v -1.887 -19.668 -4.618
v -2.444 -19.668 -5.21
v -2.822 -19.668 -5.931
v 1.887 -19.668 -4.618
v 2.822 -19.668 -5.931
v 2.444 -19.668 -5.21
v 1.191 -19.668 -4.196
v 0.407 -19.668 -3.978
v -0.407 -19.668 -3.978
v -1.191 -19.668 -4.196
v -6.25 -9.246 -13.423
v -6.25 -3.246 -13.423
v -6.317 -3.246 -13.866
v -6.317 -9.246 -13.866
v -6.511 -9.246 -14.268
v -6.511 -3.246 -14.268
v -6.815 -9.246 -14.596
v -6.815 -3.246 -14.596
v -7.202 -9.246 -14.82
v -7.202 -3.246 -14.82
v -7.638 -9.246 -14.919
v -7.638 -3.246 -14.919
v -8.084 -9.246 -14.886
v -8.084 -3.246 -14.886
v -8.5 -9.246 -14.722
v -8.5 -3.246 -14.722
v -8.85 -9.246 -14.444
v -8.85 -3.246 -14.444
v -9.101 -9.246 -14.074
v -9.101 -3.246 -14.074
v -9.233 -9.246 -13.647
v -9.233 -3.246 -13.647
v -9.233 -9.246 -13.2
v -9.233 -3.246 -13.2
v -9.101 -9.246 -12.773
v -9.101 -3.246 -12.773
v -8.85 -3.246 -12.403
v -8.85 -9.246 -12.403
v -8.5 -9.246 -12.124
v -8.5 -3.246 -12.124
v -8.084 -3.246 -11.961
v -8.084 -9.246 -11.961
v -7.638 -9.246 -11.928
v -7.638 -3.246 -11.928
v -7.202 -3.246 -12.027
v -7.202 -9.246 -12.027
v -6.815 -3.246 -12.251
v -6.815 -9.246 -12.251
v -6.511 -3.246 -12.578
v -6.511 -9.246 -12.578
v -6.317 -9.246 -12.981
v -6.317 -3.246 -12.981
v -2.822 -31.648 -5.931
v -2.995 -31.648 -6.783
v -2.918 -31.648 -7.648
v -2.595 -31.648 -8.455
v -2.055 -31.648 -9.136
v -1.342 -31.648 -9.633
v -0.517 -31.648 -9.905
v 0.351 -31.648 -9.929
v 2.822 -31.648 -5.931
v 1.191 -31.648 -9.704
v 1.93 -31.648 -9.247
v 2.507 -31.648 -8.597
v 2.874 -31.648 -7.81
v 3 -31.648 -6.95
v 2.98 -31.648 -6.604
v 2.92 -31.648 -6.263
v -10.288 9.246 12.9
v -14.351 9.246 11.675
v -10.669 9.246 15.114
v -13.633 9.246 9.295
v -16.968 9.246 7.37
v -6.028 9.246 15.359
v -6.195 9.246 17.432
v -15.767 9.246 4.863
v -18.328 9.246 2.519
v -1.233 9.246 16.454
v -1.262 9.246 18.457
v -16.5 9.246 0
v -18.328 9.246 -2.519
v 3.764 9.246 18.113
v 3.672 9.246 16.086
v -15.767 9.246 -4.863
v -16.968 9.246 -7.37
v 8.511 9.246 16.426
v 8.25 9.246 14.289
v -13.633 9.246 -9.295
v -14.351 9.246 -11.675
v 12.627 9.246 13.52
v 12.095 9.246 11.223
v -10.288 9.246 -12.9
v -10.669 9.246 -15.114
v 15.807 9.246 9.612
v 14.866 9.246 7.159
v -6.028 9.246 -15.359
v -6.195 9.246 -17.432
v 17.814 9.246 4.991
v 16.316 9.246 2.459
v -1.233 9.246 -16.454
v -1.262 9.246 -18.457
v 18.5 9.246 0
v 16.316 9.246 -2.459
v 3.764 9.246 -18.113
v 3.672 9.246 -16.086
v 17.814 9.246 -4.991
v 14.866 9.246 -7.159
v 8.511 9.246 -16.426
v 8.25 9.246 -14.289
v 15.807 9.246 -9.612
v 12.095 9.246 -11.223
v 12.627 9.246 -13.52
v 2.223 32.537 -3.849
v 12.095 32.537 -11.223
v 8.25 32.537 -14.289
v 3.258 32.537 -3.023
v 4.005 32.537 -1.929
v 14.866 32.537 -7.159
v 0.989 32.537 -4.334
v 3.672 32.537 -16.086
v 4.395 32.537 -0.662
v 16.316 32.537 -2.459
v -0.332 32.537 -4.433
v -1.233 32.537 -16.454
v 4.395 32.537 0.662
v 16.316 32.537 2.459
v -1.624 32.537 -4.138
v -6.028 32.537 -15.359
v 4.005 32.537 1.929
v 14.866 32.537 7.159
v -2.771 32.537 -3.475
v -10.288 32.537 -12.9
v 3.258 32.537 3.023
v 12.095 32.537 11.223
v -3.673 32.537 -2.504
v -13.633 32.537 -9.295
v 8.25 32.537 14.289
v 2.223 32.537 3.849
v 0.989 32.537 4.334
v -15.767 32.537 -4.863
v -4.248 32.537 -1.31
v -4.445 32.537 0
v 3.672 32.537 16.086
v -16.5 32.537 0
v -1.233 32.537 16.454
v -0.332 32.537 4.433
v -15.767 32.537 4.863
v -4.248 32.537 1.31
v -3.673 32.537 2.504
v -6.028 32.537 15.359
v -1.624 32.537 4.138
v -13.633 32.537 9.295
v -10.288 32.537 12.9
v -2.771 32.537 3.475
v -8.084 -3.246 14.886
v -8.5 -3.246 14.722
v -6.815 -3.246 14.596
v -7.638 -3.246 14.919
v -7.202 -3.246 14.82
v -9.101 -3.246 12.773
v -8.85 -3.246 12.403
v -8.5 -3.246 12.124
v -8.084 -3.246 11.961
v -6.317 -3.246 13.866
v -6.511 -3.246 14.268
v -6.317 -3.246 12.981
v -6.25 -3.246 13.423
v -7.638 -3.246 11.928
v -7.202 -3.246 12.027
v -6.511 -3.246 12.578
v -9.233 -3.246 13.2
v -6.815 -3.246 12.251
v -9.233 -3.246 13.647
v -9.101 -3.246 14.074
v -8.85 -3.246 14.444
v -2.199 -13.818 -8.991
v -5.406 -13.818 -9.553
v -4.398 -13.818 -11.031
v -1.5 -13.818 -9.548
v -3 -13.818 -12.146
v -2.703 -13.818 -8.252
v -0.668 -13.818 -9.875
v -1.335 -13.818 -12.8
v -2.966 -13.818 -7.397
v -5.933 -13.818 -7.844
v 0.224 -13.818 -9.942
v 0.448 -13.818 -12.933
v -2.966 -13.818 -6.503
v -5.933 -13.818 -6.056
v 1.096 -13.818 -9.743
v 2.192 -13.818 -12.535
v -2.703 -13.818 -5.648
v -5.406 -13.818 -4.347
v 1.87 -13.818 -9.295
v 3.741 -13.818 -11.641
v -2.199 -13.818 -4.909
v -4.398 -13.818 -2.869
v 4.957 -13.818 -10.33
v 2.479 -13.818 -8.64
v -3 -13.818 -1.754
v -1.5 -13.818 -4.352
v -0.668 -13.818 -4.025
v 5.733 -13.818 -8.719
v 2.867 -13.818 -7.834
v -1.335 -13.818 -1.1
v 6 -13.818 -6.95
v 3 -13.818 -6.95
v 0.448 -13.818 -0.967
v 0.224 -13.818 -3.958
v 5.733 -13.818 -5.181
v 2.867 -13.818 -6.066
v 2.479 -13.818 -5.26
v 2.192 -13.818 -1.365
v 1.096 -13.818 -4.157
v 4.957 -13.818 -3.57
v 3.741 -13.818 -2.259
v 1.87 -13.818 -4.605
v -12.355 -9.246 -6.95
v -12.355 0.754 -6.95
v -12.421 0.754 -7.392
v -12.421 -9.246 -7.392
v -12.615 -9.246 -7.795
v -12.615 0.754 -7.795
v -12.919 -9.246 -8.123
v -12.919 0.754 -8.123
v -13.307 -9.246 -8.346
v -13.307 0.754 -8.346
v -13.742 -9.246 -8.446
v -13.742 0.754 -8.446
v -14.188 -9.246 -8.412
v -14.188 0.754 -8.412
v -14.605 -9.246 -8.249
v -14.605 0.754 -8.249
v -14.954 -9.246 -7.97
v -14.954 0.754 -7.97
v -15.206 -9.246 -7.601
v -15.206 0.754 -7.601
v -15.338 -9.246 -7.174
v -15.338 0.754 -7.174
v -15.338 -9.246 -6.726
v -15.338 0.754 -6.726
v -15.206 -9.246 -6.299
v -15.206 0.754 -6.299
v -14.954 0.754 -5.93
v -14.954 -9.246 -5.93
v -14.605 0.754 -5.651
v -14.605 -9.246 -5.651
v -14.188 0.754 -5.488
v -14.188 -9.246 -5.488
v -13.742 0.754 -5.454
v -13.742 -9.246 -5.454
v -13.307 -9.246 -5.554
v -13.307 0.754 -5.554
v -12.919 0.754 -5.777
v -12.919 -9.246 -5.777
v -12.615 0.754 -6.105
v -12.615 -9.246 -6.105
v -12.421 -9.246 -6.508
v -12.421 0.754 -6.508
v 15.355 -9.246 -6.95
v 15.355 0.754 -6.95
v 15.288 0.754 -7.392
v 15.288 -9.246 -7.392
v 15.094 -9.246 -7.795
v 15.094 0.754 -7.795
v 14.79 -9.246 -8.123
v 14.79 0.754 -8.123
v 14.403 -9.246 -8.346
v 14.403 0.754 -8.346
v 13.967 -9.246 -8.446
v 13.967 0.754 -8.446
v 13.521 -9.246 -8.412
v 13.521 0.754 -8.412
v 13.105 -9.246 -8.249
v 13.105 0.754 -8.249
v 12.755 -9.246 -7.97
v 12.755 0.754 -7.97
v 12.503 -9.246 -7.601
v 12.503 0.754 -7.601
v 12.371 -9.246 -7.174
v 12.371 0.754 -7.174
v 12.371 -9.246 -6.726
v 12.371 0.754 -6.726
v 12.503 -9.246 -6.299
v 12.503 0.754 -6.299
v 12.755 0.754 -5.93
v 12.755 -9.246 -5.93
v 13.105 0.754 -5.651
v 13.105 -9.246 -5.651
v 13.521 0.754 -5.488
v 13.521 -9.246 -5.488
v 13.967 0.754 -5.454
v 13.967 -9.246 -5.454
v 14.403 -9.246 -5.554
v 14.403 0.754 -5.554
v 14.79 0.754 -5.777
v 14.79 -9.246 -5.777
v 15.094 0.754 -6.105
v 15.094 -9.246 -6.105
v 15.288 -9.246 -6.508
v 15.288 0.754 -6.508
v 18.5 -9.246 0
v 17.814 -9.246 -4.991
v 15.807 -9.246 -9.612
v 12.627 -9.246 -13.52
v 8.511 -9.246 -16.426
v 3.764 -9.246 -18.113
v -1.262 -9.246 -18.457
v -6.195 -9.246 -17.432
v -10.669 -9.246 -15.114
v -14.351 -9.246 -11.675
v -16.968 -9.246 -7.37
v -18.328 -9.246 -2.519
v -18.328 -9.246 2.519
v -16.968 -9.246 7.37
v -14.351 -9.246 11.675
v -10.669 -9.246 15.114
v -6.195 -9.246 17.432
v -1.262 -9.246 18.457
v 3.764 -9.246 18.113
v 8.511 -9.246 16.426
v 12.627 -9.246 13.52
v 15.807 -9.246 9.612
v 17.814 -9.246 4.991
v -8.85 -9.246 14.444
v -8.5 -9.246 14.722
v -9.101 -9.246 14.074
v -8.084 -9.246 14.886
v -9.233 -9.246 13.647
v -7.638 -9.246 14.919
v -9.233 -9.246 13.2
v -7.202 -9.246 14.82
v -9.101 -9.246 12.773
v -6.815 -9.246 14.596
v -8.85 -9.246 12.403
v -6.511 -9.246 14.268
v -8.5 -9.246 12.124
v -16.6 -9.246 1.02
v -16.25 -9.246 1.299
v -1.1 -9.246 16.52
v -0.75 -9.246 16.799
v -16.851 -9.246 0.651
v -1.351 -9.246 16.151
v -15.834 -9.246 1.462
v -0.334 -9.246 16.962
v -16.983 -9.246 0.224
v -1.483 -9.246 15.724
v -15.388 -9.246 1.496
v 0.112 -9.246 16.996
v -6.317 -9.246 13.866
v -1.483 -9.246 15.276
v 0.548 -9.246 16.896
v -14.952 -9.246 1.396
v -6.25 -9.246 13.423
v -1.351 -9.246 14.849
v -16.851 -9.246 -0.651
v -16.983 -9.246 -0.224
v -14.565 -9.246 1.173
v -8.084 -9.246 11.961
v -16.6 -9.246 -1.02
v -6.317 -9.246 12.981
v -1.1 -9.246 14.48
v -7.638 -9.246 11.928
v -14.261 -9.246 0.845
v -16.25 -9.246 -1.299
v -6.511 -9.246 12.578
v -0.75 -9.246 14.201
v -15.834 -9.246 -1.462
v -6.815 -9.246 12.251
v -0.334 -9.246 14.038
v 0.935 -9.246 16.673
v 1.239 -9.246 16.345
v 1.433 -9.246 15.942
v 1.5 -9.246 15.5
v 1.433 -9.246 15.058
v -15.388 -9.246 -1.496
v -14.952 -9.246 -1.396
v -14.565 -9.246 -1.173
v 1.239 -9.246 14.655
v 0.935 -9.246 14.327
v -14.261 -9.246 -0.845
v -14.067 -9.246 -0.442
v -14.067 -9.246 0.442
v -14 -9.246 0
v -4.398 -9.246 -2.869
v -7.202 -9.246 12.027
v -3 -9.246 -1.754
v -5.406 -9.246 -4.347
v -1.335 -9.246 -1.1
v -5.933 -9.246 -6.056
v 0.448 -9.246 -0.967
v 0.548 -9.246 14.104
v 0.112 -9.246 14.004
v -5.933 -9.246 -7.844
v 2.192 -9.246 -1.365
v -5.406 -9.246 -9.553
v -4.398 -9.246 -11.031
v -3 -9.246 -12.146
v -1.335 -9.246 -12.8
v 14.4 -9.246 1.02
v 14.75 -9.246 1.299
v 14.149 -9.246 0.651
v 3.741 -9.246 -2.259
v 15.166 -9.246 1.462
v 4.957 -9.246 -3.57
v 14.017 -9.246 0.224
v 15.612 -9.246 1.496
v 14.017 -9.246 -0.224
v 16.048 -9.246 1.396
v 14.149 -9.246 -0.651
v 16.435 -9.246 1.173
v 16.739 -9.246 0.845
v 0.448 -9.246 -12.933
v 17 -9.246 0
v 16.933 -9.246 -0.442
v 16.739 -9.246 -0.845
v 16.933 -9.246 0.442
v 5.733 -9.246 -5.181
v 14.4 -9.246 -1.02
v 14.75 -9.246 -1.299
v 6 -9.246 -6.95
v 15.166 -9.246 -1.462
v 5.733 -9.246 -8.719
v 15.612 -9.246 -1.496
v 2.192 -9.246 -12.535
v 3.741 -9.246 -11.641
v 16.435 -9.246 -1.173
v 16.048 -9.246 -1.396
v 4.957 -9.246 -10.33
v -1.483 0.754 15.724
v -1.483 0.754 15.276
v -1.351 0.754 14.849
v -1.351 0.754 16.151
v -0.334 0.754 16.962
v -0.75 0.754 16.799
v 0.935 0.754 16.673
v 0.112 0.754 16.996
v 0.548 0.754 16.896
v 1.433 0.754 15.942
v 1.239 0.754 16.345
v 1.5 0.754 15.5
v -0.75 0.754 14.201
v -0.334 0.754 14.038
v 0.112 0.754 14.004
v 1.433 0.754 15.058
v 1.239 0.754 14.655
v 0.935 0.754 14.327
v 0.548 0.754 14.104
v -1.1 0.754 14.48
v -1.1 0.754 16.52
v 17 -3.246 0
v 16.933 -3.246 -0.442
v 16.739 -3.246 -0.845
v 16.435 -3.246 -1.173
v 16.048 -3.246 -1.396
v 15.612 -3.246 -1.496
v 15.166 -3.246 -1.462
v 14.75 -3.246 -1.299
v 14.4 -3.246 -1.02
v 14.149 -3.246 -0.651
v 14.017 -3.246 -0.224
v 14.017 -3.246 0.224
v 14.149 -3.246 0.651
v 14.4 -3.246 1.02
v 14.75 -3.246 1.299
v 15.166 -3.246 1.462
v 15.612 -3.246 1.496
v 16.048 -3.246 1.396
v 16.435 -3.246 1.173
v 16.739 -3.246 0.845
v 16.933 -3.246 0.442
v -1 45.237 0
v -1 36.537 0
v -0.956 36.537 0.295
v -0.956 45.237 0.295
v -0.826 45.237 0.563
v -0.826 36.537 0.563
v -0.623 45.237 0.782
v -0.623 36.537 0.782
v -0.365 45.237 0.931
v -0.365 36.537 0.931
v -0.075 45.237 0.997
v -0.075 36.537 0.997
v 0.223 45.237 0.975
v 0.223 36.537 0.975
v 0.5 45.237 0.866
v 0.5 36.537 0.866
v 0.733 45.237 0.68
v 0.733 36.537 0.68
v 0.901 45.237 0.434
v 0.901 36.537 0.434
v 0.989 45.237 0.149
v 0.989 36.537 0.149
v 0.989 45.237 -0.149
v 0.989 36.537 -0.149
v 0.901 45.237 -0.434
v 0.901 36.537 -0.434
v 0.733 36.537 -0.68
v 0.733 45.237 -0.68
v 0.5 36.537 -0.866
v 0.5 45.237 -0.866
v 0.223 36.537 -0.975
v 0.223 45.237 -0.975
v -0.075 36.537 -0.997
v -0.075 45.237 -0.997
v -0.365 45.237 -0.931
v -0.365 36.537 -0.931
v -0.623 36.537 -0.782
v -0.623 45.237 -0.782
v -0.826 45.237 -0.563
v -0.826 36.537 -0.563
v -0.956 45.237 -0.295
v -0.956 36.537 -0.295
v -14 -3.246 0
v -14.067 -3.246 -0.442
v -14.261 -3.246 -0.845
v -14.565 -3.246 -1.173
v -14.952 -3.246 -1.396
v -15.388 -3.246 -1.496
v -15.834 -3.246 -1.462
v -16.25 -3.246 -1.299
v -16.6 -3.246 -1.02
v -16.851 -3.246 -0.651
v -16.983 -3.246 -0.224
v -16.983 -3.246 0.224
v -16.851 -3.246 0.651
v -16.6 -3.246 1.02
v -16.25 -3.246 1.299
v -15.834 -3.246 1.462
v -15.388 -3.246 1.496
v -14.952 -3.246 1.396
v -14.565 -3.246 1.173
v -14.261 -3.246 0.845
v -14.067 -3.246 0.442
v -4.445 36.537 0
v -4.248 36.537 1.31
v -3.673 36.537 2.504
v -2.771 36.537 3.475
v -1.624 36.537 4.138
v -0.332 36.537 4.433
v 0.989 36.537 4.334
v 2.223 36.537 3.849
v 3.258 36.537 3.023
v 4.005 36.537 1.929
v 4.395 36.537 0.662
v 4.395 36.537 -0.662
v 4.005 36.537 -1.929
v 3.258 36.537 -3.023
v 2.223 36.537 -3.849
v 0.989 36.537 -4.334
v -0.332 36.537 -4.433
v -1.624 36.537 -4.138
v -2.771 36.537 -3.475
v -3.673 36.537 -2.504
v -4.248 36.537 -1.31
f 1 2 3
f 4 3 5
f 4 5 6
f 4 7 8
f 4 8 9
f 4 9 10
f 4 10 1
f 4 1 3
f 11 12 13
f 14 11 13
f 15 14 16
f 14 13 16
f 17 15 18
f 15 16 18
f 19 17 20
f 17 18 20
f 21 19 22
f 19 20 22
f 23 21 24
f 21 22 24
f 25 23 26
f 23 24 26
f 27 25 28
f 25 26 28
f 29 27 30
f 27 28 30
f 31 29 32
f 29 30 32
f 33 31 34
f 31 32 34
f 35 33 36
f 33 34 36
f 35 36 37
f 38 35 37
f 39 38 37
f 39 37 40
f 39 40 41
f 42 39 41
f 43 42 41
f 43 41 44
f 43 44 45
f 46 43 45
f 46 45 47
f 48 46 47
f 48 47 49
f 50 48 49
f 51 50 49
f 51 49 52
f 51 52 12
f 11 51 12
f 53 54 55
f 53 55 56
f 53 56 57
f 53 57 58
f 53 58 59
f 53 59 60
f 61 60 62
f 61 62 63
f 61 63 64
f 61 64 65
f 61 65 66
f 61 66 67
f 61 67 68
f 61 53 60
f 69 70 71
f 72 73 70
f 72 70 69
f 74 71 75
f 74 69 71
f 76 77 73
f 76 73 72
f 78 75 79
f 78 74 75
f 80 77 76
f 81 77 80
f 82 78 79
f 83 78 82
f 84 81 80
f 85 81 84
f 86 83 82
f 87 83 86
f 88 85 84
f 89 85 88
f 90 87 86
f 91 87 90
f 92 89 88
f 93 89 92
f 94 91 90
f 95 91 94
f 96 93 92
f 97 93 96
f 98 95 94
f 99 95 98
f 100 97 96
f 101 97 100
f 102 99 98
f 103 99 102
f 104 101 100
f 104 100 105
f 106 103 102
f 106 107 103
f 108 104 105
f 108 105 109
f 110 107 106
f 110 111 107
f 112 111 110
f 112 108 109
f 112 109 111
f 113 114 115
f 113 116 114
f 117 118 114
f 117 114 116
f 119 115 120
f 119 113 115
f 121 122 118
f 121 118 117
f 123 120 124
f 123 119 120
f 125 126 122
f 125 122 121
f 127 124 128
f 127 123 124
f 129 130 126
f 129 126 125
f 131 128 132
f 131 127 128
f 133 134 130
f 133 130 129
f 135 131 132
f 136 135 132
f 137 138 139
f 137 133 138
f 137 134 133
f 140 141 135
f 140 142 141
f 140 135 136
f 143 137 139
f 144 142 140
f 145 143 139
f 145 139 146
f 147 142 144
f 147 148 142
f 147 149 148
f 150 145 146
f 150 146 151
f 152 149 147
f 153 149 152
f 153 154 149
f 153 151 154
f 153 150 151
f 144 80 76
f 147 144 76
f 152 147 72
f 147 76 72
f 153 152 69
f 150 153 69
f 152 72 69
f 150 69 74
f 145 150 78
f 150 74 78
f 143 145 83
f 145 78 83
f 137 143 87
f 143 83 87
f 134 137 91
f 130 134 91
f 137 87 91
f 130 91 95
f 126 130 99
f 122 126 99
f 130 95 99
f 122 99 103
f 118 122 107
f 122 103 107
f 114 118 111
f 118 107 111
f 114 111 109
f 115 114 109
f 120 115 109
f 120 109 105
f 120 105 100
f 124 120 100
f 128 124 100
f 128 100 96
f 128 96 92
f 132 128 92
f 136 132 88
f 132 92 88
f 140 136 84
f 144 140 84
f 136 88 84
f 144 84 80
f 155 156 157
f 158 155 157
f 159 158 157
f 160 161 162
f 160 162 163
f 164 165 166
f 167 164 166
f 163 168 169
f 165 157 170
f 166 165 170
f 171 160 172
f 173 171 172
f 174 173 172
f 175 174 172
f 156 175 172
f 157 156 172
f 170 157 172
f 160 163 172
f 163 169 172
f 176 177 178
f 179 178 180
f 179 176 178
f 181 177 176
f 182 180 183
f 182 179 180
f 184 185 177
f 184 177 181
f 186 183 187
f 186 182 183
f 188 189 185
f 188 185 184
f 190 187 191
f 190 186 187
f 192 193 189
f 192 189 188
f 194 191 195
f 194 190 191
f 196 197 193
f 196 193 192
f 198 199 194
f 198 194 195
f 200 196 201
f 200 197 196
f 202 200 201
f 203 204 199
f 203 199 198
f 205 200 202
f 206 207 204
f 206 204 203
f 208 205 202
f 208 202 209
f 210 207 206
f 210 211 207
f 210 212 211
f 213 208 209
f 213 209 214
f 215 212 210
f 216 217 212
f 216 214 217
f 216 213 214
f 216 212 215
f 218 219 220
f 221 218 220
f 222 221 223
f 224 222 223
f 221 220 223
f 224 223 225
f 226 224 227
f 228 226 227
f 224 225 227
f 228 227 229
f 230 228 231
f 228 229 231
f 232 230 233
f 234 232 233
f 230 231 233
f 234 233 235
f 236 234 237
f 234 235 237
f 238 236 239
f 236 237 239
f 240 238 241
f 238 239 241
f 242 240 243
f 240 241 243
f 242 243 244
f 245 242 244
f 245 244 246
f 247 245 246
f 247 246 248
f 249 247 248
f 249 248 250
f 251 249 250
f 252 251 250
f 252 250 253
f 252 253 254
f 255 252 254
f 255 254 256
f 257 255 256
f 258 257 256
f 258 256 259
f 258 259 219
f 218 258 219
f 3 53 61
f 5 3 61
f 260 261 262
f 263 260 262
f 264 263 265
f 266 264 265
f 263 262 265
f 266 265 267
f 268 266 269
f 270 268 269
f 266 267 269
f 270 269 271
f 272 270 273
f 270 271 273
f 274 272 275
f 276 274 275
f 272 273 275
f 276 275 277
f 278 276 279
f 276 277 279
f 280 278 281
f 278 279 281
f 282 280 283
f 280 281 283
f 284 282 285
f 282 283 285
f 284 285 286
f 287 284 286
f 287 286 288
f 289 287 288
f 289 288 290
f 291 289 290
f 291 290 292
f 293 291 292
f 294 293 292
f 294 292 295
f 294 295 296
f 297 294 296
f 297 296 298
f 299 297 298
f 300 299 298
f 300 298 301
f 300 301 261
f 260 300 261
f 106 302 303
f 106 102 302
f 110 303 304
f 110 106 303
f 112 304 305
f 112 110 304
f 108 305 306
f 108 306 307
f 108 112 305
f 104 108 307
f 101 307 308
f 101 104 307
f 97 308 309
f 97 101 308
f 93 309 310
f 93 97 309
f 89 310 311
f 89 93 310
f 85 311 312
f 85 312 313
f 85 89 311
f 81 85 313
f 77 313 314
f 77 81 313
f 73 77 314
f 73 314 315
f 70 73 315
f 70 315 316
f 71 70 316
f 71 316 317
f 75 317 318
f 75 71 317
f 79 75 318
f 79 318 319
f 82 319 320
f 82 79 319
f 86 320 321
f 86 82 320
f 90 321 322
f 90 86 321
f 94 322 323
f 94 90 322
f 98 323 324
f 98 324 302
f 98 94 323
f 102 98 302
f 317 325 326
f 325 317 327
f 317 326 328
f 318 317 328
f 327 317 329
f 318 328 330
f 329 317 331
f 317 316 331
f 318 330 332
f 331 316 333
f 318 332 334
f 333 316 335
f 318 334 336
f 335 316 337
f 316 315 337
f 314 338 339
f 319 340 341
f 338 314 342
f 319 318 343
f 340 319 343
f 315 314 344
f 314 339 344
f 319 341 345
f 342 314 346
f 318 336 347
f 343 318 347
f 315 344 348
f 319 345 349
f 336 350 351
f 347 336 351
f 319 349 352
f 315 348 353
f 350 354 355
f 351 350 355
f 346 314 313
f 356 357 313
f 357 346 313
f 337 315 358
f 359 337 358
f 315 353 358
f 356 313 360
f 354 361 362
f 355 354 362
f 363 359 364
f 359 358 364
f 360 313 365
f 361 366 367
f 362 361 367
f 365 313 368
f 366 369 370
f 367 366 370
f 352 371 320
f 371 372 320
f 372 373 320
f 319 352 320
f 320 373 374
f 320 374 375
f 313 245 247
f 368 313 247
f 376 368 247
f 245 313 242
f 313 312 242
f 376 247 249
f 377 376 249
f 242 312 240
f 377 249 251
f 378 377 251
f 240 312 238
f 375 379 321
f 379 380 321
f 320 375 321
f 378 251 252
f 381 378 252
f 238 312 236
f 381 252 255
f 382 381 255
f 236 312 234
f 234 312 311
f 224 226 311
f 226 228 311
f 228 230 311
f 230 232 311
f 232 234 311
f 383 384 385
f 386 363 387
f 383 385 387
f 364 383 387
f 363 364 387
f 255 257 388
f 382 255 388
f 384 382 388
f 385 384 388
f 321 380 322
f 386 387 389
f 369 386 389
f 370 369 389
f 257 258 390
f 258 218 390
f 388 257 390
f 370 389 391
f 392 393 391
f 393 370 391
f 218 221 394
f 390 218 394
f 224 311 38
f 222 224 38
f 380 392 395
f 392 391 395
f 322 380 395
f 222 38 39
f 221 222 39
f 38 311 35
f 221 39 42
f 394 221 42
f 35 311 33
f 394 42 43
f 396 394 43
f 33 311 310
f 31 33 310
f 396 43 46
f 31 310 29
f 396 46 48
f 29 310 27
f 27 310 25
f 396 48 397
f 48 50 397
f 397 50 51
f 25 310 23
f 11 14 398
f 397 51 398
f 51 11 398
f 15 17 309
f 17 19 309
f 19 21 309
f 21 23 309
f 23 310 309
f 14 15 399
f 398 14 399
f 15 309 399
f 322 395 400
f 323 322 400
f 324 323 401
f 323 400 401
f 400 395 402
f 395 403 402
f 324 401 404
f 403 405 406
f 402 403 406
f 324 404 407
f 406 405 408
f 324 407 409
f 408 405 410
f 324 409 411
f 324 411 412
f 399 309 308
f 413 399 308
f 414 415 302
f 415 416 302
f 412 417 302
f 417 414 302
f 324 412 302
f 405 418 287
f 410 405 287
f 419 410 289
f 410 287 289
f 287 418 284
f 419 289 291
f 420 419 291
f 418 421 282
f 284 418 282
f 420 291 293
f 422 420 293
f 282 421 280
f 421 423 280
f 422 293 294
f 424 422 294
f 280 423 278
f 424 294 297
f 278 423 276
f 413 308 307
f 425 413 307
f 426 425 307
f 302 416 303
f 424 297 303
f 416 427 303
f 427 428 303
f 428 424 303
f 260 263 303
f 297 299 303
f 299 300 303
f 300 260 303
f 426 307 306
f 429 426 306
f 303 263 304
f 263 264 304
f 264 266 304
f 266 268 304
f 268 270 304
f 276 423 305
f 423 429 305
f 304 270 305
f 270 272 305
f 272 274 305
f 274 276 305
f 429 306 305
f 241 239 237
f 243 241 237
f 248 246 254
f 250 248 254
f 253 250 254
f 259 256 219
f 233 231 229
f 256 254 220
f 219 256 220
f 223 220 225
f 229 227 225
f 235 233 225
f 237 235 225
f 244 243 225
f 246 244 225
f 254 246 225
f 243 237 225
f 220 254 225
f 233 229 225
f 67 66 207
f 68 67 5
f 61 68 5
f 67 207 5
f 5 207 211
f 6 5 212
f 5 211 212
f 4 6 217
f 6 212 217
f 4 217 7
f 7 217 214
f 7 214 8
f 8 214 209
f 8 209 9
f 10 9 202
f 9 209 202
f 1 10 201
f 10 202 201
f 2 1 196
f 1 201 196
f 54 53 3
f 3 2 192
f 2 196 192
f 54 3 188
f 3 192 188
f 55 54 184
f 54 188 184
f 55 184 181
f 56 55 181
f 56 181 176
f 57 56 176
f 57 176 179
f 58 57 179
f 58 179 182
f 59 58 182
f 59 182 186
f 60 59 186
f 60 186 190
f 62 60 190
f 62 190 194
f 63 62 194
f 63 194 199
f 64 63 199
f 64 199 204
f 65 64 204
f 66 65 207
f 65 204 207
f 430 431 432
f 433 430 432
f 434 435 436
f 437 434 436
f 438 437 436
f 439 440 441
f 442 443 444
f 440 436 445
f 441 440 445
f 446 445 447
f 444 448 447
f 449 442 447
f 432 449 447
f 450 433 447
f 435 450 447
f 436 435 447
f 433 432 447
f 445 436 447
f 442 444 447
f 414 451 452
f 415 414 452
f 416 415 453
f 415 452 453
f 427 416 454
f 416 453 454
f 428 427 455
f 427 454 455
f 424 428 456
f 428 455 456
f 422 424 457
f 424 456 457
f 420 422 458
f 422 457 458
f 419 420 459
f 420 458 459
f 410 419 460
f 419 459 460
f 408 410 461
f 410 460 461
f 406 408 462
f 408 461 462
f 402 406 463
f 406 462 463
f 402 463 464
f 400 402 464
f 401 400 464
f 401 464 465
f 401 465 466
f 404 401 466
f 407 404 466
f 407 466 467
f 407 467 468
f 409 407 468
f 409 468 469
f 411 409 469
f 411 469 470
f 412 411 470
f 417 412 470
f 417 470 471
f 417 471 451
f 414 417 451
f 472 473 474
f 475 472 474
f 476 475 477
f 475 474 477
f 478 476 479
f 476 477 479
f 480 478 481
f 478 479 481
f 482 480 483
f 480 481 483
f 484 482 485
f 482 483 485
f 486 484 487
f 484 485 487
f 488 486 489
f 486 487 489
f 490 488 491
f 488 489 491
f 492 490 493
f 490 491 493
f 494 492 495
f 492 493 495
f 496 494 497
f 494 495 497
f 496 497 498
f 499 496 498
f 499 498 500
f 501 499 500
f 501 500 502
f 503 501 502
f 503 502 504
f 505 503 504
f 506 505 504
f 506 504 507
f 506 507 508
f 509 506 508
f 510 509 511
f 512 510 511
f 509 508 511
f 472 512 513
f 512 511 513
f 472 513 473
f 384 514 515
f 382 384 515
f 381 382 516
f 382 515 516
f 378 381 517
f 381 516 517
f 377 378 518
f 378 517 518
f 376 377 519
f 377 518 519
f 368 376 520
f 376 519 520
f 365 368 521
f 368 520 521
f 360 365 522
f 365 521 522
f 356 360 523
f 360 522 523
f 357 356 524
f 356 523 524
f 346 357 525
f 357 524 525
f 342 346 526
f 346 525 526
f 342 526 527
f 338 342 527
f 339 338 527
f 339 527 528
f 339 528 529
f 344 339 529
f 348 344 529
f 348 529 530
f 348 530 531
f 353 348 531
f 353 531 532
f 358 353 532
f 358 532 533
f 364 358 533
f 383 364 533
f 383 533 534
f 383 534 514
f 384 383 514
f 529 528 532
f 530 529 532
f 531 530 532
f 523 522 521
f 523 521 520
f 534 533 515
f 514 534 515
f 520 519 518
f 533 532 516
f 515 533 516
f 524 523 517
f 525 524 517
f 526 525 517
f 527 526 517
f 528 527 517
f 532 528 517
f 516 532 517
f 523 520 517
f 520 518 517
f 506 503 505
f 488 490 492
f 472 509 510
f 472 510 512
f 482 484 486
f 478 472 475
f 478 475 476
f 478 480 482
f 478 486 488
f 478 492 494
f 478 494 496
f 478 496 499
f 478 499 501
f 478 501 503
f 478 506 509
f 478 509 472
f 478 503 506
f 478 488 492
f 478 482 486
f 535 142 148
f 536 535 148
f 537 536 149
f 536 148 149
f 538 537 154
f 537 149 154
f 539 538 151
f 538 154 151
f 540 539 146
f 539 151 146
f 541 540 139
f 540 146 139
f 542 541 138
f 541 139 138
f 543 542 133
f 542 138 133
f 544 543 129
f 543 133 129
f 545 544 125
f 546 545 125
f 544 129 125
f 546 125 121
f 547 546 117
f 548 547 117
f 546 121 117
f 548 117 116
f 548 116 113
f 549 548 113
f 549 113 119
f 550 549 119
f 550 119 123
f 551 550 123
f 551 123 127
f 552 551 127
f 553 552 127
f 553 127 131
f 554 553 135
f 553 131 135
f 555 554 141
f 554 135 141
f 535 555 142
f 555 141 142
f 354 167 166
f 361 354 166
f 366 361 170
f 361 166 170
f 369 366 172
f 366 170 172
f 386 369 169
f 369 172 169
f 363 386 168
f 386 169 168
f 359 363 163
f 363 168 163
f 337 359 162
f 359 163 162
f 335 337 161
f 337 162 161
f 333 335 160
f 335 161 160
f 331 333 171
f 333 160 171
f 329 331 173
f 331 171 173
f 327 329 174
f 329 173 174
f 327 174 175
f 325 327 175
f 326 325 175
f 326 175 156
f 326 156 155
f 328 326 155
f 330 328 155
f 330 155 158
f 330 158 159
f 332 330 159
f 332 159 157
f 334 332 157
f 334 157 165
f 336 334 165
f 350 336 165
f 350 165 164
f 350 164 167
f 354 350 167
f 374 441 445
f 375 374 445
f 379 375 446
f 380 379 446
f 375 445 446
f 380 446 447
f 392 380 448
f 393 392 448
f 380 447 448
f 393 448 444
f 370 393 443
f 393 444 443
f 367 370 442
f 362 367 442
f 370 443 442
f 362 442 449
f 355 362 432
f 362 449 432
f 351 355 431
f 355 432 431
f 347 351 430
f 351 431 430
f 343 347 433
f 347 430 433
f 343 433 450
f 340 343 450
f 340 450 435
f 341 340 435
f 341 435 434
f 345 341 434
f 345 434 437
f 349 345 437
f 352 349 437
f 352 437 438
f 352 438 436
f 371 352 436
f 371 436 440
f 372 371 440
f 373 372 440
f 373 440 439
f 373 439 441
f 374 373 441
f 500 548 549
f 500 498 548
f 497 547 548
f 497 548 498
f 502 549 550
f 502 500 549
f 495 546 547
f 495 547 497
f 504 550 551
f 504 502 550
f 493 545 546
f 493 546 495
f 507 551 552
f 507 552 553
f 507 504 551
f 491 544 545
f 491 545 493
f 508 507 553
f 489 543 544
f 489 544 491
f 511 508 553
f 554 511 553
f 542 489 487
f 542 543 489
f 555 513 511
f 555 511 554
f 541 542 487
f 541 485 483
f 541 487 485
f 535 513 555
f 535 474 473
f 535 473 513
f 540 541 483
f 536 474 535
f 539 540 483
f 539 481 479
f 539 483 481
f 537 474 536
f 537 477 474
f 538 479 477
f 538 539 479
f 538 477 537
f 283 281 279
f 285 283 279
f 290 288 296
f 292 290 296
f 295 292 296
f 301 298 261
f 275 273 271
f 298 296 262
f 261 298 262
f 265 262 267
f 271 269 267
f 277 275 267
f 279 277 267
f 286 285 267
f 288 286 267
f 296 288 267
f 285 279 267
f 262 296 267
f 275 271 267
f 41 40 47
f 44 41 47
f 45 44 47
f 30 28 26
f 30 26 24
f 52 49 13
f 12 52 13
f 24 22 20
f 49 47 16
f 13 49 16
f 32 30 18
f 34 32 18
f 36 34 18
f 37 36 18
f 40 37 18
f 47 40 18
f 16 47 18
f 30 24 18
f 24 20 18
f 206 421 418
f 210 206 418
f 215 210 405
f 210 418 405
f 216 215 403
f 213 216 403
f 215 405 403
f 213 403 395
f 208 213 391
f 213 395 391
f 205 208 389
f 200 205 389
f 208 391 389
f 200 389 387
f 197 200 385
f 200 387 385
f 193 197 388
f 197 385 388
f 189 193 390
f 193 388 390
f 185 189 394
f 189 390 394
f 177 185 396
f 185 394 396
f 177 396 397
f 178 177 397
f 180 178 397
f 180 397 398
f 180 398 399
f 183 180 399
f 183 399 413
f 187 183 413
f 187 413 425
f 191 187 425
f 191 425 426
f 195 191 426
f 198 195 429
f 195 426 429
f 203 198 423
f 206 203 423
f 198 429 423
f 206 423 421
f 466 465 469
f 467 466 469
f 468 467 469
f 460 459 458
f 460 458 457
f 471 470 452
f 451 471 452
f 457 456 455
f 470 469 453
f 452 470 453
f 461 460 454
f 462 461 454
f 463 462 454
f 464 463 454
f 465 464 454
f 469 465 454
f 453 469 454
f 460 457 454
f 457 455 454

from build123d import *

# Parameters (mm, degrees)
SCHIZZO1_W                   = 18.5
SCHIZZO1_H                   = 18.4912
SCHIZZO2_R                   = 6
ESTRUSIONE_ESTRUSIONE1_DEPTH = 4.572
SCHIZZO3_R                   = 3
ESTRUSIONE_ESTRUSIONE2_DEPTH = 17.83
TAGLIO_ESTRUSIONE1_DEPTH     = 11.98
SCHIZZO5_R                   = 16.5
ESTRUSIONE_ESTRUSIONE3_DEPTH = 23.2918
SCHIZZO6_R                   = 4.445
ESTRUSIONE_ESTRUSIONE4_DEPTH = 4
SCHIZZO7_R                   = 1
ESTRUSIONE_ESTRUSIONE5_DEPTH = 8.7
FORO_3_0_3_1_D               = 3
FORO_3_0_3_1_DEPTH           = 6
FORO_3_0_3_2_D               = 3
FORO_3_0_3_2_DEPTH           = 10


with BuildPart() as part:
    # Schizzo1 → Rivoluzione1 (revolve)
    with BuildSketch(Plane(origin=(0, 0, 0), x_dir=(-1, 0, 0), z_dir=(0, 0, -1))):
        with Locations((-9.25, 0)):
            Rectangle(SCHIZZO1_W, SCHIZZO1_H)
    revolve(axis=Axis((0, -9.2456, 0), (0, 1, 0)))

    # Schizzo2 → Estrusione-Estrusione1 (add)
    with BuildSketch(Plane.XZ.offset(9.2456)):
        with Locations((0, -6.95)):
            Circle(SCHIZZO2_R)
    extrude(amount=ESTRUSIONE_ESTRUSIONE1_DEPTH)

    # Schizzo3 → Estrusione-Estrusione2 (add)
    with BuildSketch(Plane.XZ.offset(13.8176)):
        with Locations((0, -6.95)):
            Circle(SCHIZZO3_R)
    extrude(amount=ESTRUSIONE_ESTRUSIONE2_DEPTH)

    # Schizzo4 → Taglio-Estrusione1 (cut)
    with BuildSketch(Plane.XZ.offset(31.6476)):
        with BuildLine():
            Line((-2.821661699, -5.931066609), (2.821661699, -5.931066609))
            ThreePointArc((2.821661699, -5.931066609), (0, -3.95), (-2.821661699, -5.931066609))
        make_face()
    extrude(amount=-TAGLIO_ESTRUSIONE1_DEPTH, mode=Mode.SUBTRACT)

    # Schizzo5 → Estrusione-Estrusione3 (add)
    with BuildSketch(Plane(origin=(0, 9.2456, 0), x_dir=(-1, 0, 0), z_dir=(0, 1, 0))):
        Circle(SCHIZZO5_R)
    extrude(amount=ESTRUSIONE_ESTRUSIONE3_DEPTH)

    # Schizzo6 → Estrusione-Estrusione4 (add)
    with BuildSketch(Plane(origin=(0, 32.5374, 0), x_dir=(-1, 0, 0), z_dir=(0, 1, 0))):
        Circle(SCHIZZO6_R)
    extrude(amount=ESTRUSIONE_ESTRUSIONE4_DEPTH)

    # Schizzo7 → Estrusione-Estrusione5 (add)
    with BuildSketch(Plane(origin=(0, 36.5374, 0), x_dir=(-1, 0, 0), z_dir=(0, 1, 0))):
        Circle(SCHIZZO7_R)
    extrude(amount=ESTRUSIONE_ESTRUSIONE5_DEPTH)

    # Foro Ø3.0 (3)-1
    with Locations(Plane(origin=(0, -9.2456, 0), x_dir=(-1, 0, 0), z_dir=(0, -1, 0))):
        with Locations((15.5, 0), (7.75, -13.423393759), (-15.5, 0), (7.75, 13.423393759)):
            Hole(FORO_3_0_3_1_D / 2, depth=FORO_3_0_3_1_DEPTH)

    # Foro Ø3.0 (3)-2
    with Locations(Plane(origin=(0, -9.2456, 0), x_dir=(-1, 0, 0), z_dir=(0, -1, 0))):
        with Locations((13.8545119, 6.95), (-13.8545119, 6.95), (0, -15.5)):
            Hole(FORO_3_0_3_2_D / 2, depth=FORO_3_0_3_2_DEPTH)


solid = part.part
